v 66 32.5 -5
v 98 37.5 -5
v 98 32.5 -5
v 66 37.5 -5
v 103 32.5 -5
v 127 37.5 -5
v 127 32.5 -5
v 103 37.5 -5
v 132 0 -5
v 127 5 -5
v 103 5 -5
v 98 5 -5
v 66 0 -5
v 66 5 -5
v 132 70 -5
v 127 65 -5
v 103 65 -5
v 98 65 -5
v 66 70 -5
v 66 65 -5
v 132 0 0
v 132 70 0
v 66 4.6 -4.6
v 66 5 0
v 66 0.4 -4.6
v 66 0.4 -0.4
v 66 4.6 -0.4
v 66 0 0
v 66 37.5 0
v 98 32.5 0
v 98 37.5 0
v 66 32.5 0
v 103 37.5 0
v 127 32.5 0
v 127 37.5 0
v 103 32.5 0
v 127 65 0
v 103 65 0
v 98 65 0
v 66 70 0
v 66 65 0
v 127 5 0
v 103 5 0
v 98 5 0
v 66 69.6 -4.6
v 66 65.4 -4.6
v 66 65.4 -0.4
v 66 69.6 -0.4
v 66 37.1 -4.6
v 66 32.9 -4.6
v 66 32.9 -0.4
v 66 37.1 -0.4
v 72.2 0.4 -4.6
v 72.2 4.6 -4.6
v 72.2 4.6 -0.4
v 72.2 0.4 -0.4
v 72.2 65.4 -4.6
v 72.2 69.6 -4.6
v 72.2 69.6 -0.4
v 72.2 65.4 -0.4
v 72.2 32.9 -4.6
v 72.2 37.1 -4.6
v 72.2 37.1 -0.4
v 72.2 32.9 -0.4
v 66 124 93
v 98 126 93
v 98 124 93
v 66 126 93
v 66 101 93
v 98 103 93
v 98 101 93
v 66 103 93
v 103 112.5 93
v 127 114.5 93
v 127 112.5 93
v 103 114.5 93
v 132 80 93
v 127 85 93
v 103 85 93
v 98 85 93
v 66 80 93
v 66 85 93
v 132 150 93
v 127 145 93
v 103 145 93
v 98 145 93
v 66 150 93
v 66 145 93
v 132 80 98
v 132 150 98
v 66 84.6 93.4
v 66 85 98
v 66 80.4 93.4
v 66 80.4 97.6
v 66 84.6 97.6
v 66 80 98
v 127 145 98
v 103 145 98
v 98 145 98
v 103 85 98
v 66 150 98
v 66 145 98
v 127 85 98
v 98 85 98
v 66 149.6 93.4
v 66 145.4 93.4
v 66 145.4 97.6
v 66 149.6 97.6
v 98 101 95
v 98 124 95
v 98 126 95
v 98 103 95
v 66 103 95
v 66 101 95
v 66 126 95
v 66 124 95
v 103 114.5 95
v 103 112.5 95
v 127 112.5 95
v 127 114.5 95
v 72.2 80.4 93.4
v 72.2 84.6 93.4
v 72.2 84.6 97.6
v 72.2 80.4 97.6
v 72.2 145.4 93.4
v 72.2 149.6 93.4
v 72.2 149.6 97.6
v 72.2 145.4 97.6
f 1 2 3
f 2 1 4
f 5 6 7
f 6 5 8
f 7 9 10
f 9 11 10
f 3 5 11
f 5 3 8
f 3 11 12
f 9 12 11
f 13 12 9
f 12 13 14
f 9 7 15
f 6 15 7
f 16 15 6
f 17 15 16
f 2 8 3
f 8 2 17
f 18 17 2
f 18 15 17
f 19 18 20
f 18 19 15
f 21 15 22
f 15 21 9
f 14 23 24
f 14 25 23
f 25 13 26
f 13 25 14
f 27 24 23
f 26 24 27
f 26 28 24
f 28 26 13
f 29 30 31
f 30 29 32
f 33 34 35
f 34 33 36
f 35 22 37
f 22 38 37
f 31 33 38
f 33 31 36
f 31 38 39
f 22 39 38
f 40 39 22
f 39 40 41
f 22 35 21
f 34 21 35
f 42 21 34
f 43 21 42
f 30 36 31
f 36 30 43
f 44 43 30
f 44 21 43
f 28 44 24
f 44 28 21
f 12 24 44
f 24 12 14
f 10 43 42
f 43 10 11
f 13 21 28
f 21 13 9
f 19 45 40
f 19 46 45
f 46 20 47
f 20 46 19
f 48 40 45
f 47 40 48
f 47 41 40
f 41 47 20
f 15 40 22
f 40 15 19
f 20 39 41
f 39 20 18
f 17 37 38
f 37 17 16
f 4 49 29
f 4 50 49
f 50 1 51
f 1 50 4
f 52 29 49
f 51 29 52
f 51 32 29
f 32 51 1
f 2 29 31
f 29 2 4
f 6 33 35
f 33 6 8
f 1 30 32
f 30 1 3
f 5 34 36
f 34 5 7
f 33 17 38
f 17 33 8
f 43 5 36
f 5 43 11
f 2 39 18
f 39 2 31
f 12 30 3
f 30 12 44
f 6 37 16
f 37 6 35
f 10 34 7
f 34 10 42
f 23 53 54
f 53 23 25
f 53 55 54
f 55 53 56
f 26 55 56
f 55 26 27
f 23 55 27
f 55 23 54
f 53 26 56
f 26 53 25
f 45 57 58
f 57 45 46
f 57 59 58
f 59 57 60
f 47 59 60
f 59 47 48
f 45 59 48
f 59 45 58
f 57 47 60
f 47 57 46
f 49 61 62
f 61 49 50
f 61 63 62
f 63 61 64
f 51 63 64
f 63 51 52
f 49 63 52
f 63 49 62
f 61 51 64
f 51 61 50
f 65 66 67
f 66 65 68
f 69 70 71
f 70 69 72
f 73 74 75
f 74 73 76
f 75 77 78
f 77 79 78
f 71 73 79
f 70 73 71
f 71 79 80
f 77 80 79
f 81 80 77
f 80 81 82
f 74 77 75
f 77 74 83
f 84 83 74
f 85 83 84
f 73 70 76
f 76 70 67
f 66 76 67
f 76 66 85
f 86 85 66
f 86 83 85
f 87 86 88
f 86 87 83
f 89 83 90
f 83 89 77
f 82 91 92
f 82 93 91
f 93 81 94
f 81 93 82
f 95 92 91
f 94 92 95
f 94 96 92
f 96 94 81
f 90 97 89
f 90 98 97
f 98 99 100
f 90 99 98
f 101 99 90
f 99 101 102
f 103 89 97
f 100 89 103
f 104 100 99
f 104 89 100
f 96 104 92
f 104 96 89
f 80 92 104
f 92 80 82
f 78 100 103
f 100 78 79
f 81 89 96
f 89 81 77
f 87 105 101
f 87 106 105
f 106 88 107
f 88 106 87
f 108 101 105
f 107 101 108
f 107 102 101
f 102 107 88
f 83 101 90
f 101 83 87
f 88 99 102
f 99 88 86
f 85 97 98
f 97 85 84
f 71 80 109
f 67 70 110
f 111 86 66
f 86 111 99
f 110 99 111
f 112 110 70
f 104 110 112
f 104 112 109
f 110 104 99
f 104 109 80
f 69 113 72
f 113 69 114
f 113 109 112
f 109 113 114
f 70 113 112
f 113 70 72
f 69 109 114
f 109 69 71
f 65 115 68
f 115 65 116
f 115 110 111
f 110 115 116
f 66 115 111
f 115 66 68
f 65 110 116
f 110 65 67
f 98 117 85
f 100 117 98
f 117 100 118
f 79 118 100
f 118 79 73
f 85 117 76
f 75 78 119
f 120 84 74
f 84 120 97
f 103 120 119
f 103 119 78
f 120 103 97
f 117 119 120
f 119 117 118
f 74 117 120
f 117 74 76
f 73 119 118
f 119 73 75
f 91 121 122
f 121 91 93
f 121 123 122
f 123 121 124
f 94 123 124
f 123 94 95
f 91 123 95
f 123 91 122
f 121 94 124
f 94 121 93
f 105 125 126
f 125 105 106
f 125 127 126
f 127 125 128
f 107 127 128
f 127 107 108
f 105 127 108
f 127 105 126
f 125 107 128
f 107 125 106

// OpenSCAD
// Neato XV Signature Pro - Right Pod SIDES
// Sockets (4.8x4.8mm x 6mm deep) in bottom of each corner/center post
// accept matching bosses from right_pod_base.scad.
//
// PRINT ORIENTATION: lay frame flat on its OUTER face (the face facing
// away from robot). Posts print horizontally — stronger layer lines,
// faster print than vertical orientation.
// No supports needed.

// ============================================================
// PARAMETERS (must match right_pod_base.scad)
// ============================================================

pod_width  = 103;
pod_depth  = 70;
pod_height = 66;

rail_w = 5;

mid_beam_z = 32;  // raised to clear ports (board at 14mm, ports span 14-29mm)

// Port-aware inner rail gap positions (measured from ruler)
port_post_nic_usb3  = 22;
port_post_usb3_usb2 = 45;
thin_post = 2;

// Socket dimensions — fit over 4x4mm bosses with 0.2mm clearance
// 4.2mm socket fits inside 5mm rail with 0.4mm wall each side
socket_size  = 4.2;
socket_depth = 6.2;  // slightly deeper than boss for easy assembly

// ============================================================
// MODULES
// ============================================================

module socket() {
    translate([-socket_size/2, -socket_size/2, 0])
        cube([socket_size, socket_size, socket_depth]);
}

module outer_side() {
    difference() {
        union() {
            // Back post
            cube([rail_w, rail_w, pod_height]);
            // Front post
            translate([0, pod_depth - rail_w, 0])
                cube([rail_w, rail_w, pod_height]);
            // Center post
            translate([0, pod_depth/2 - rail_w/2, 0])
                cube([rail_w, rail_w, pod_height]);
            // Mid horizontal
            translate([0, 0, mid_beam_z])
                cube([rail_w, pod_depth, rail_w]);
            // Top horizontal
            translate([0, 0, pod_height - rail_w])
                cube([rail_w, pod_depth, rail_w]);
        }
        // Sockets in base of posts
        translate([rail_w/2, rail_w/2, 0])           socket();  // back
        translate([rail_w/2, pod_depth - rail_w/2, 0]) socket();  // front
        translate([rail_w/2, pod_depth/2, 0])          socket();  // center
    }
}

module inner_side() {
    difference() {
        union() {
            // Back corner post (NIC side)
            translate([pod_width - rail_w, 0, 0])
                cube([rail_w, rail_w, pod_height]);
            // Front corner post (USB side)
            translate([pod_width - rail_w, pod_depth - rail_w, 0])
                cube([rail_w, rail_w, pod_height]);
            // Thin inter-port posts (reach up to mid beam)
            translate([pod_width - thin_post, port_post_nic_usb3 - thin_post/2, 0])
                cube([thin_post, thin_post, mid_beam_z]);
            translate([pod_width - thin_post, port_post_usb3_usb2 - thin_post/2, 0])
                cube([thin_post, thin_post, mid_beam_z]);
            // Mid horizontal beam
            translate([pod_width - rail_w, 0, mid_beam_z])
                cube([rail_w, pod_depth, rail_w]);
            // Single center post above mid beam
            translate([pod_width - thin_post, (port_post_nic_usb3 + port_post_usb3_usb2)/2 - thin_post/2, mid_beam_z + rail_w])
                cube([thin_post, thin_post, pod_height - mid_beam_z - rail_w*2]);
            // Top horizontal beam
            translate([pod_width - rail_w, 0, pod_height - rail_w])
                cube([rail_w, pod_depth, rail_w]);
        }
        // Sockets in base of corner posts only
        translate([pod_width - rail_w/2, rail_w/2, 0])           socket();  // back
        translate([pod_width - rail_w/2, pod_depth - rail_w/2, 0]) socket();  // front
    }
}

// ============================================================
// MAIN
// Each side rotated 90° on X axis so it lies flat on the print bed.
// Posts print horizontally — stronger layer adhesion, faster print.
// ============================================================

// Outer side — rotate flat, flip so outer face is on bed
translate([pod_height, 0, 0])
rotate([0, 90, 0])
outer_side();

// Inner side — rotate flat, shift geometry to Z=0, offset in Y
translate([pod_height, pod_depth + 10, pod_width - rail_w])
rotate([0, 90, 0])
translate([-(pod_width - rail_w), 0, 0])
inner_side();
